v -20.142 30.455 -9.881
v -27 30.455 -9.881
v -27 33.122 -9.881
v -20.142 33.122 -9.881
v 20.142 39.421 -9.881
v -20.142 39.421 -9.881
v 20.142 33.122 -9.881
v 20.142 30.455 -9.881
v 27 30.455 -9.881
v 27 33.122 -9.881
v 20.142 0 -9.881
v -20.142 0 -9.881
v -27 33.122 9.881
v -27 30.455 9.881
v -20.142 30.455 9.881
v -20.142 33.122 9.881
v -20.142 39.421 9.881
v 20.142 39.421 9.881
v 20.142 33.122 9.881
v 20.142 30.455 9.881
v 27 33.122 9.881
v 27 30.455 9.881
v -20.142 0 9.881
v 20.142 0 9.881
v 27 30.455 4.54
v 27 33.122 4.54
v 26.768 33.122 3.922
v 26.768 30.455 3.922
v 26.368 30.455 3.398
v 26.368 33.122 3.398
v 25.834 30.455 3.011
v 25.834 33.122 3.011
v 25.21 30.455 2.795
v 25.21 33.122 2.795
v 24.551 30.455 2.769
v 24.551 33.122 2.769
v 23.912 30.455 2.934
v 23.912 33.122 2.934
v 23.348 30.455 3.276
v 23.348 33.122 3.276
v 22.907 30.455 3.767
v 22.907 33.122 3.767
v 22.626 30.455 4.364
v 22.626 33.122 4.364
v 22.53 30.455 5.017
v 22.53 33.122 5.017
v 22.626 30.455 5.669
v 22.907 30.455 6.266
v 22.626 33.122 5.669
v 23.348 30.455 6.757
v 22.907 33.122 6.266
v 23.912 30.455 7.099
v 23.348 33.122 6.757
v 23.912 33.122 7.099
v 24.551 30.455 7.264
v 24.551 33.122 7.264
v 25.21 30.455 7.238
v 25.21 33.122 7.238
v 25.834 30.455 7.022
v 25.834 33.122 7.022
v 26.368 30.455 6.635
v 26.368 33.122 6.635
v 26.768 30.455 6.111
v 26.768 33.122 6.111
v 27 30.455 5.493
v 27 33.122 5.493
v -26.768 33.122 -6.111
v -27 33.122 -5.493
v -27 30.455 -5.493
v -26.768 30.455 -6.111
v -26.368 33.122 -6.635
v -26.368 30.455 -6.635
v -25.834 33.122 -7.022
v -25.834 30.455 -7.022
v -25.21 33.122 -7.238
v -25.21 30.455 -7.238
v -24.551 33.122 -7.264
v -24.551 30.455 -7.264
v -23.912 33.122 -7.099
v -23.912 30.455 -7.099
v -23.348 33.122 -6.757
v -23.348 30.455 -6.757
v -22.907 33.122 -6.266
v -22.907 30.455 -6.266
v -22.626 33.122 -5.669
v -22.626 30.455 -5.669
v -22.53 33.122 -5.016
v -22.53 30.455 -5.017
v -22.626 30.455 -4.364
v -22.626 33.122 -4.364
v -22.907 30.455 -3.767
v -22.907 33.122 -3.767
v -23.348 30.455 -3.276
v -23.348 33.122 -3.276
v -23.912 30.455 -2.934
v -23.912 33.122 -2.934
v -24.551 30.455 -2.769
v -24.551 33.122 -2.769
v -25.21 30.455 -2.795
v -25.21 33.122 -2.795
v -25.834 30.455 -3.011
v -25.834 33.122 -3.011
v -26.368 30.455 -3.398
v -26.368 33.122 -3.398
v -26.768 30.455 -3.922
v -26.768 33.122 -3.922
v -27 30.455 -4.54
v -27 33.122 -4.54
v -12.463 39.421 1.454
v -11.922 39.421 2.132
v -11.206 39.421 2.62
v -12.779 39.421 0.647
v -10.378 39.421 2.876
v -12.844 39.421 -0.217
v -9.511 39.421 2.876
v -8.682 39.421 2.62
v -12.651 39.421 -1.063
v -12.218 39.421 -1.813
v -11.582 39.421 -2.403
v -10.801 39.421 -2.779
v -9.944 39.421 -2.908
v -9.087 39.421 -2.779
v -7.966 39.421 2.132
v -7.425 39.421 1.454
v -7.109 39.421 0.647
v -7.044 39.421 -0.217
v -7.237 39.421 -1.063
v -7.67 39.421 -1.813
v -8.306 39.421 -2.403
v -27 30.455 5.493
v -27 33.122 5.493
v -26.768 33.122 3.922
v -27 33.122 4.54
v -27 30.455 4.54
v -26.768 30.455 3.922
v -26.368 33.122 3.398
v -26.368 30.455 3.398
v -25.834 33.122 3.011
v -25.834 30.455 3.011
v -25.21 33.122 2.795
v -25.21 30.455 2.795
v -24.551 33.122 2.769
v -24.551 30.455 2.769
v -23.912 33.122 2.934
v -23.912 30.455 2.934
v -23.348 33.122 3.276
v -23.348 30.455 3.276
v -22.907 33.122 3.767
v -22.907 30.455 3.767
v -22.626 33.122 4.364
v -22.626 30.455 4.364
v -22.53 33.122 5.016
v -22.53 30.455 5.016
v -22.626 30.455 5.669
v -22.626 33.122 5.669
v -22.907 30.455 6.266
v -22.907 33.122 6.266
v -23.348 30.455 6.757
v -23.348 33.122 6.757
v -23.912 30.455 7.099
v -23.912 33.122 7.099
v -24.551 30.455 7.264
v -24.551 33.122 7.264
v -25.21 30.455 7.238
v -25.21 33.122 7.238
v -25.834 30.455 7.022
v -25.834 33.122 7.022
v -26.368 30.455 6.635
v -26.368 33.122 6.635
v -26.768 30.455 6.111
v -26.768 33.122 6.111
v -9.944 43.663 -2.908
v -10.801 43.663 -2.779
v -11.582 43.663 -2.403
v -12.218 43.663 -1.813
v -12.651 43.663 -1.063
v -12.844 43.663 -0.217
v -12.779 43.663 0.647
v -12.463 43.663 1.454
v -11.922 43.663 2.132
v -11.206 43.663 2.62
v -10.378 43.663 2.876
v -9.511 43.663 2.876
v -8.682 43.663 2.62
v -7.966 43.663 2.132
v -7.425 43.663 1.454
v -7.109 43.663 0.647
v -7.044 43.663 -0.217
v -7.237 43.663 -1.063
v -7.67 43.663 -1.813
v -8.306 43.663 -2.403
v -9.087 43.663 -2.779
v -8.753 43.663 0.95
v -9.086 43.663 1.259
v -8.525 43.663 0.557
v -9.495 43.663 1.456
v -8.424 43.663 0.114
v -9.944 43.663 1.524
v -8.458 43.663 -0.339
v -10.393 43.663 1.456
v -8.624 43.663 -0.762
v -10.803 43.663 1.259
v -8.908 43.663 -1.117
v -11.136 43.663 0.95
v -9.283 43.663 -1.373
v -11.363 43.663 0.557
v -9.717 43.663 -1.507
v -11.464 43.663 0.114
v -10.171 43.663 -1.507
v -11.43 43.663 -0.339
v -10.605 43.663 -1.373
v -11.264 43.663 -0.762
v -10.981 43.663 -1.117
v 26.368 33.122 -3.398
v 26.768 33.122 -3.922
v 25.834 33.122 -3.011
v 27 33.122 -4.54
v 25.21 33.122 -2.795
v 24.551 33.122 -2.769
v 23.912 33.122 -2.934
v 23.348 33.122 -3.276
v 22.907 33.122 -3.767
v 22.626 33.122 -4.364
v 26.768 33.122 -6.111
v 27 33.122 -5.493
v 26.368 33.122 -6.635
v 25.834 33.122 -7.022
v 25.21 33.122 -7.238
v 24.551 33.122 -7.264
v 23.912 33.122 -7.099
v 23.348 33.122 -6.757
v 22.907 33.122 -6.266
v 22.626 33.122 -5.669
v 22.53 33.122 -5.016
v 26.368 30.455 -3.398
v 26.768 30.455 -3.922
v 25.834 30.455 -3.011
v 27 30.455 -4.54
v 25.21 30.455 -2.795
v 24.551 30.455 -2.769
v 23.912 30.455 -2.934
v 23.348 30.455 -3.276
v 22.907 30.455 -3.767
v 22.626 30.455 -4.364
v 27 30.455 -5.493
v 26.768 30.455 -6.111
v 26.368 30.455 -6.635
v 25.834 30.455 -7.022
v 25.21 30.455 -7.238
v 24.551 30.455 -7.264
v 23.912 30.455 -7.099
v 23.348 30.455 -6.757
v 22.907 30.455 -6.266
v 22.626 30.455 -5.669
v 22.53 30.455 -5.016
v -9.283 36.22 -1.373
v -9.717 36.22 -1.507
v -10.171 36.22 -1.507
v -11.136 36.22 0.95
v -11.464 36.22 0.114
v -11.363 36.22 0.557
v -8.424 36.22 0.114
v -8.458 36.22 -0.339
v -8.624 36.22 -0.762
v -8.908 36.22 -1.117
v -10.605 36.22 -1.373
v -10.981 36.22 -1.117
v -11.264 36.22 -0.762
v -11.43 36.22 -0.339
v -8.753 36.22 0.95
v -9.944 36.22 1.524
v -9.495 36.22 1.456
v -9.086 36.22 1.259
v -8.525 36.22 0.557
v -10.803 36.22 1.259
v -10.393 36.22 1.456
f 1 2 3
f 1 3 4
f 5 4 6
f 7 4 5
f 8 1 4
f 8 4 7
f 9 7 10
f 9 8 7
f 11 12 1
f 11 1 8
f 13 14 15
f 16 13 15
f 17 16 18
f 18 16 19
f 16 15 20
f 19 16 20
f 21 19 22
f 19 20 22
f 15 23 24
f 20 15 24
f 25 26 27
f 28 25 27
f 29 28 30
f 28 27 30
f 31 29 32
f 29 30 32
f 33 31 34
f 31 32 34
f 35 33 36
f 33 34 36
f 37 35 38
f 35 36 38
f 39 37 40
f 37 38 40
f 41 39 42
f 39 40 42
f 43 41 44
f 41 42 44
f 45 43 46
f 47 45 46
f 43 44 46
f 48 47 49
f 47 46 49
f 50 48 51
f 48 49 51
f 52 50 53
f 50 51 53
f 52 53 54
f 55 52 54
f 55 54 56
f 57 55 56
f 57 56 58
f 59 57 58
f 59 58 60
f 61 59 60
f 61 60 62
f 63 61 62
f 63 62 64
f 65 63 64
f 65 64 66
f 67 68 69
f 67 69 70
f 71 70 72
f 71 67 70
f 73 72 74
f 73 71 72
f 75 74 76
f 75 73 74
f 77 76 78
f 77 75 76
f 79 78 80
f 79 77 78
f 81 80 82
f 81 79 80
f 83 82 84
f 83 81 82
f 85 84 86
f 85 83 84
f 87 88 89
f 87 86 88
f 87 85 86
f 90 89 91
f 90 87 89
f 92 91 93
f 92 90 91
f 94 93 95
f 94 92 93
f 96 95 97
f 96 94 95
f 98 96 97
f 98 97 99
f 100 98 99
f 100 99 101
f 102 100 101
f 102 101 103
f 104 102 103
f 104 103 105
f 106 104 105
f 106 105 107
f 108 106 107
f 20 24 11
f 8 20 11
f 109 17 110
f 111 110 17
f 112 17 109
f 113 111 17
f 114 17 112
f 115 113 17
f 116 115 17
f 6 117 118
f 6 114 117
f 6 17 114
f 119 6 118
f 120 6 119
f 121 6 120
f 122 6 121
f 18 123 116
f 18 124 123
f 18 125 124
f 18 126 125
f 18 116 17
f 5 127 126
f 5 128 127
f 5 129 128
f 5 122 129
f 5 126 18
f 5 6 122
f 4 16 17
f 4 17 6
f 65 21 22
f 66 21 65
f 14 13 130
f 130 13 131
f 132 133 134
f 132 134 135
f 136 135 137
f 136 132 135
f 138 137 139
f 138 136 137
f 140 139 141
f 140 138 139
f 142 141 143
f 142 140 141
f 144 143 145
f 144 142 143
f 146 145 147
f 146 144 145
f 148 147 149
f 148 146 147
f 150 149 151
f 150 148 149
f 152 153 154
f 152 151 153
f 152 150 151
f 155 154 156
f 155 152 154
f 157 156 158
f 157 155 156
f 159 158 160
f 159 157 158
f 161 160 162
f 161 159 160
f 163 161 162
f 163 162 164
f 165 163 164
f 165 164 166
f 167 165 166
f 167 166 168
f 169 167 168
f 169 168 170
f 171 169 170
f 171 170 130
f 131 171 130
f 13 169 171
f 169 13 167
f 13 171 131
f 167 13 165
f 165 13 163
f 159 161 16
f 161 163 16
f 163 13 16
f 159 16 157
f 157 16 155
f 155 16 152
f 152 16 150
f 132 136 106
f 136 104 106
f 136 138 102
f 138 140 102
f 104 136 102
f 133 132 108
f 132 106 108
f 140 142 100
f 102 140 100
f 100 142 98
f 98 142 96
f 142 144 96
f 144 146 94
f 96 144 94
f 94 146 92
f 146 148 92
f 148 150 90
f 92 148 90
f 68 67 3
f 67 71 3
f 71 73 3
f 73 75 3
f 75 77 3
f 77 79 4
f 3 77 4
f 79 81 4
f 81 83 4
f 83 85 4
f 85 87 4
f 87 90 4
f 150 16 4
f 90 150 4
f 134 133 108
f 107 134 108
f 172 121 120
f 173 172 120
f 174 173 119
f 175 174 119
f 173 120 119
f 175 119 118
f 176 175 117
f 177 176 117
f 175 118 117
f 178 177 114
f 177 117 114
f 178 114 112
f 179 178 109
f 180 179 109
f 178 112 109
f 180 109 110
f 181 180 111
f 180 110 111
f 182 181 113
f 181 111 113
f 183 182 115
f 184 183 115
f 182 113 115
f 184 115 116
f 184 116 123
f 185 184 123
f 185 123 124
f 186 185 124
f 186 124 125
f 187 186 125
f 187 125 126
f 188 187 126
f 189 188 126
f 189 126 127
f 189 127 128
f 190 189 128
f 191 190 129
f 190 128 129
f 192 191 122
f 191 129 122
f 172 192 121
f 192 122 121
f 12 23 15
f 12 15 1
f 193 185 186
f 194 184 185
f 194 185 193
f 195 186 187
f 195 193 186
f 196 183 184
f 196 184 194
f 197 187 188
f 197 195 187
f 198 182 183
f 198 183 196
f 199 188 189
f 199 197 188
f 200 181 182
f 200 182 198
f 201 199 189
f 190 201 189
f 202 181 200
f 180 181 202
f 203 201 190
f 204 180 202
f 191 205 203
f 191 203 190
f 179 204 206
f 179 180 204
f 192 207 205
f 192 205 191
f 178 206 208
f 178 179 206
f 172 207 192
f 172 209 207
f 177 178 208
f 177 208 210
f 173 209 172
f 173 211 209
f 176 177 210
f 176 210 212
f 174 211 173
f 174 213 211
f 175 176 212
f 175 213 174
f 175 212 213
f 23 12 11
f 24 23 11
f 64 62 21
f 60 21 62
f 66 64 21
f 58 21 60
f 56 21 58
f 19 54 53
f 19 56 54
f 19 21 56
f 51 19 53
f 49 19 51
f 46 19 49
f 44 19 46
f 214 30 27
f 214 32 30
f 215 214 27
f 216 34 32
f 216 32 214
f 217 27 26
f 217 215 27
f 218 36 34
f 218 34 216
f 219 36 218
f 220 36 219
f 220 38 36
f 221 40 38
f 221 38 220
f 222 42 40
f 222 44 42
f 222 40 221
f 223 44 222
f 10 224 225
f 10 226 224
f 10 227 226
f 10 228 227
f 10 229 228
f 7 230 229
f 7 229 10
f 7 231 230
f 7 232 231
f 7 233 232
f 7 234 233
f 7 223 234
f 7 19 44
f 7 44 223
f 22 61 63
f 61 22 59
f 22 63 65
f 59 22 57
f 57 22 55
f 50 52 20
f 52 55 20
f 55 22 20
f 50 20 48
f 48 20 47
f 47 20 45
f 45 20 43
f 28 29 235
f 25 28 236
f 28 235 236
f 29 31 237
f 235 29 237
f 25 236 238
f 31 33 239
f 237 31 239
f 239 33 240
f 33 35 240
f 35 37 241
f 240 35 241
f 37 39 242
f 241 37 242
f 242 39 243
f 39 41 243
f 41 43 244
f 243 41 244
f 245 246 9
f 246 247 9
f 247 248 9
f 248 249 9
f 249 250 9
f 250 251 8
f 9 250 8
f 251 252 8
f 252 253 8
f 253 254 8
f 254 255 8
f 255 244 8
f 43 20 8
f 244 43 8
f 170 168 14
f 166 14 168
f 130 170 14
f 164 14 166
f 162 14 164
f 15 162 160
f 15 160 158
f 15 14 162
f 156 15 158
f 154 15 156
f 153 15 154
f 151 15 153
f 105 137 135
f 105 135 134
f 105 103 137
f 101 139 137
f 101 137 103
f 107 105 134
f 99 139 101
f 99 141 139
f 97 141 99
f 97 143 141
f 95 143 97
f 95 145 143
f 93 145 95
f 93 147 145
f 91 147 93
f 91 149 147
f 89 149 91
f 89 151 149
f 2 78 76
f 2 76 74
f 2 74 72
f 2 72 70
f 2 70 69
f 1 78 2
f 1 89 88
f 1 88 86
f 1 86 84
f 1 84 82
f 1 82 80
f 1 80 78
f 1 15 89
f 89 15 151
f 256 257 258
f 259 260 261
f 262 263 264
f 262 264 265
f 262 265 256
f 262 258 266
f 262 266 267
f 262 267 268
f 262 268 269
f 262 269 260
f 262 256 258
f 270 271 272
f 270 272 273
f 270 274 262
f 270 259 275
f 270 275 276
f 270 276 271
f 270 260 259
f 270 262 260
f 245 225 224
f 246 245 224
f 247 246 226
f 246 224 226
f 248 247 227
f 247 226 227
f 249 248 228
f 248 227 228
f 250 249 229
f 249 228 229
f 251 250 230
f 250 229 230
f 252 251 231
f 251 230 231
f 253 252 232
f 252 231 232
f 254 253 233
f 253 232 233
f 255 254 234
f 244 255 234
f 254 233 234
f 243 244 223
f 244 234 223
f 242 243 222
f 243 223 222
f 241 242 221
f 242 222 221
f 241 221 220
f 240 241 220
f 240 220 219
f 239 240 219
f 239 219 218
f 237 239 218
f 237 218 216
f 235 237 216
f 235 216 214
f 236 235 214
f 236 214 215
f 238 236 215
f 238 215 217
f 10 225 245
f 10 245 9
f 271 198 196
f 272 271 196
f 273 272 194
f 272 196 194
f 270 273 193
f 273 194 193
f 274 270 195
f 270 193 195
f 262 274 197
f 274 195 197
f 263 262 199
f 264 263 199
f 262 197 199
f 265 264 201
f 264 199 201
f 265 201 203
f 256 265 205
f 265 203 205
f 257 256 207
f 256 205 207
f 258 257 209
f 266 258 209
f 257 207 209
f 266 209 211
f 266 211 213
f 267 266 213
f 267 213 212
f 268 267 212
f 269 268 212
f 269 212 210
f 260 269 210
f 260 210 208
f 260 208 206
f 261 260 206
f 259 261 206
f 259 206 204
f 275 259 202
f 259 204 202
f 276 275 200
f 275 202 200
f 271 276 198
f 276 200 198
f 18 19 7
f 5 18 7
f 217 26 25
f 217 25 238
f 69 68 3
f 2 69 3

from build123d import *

# Parameters (mm, degrees)
SKETCH1_W           = 40.2844
SKETCH1_H           = 19.7612
BOSS_EXTRUDE1_DEPTH = 39.4208
SKETCH2_W           = 19.7612
SKETCH2_H           = 2.667
BOSS_EXTRUDE2_DEPTH = 6.858
SKETCH3_R           = 2.2606
CUT_EXTRUDE2_DEPTH  = 44.859747411
SKETCH4_R           = 2.9083
BOSS_EXTRUDE3_DEPTH = 4.2418
SKETCH5_R           = 1.524
CUT_EXTRUDE3_DEPTH  = 7.4422


with BuildPart() as part:
    # Sketch1 → Boss-Extrude1 (new body)
    with BuildSketch(Plane(origin=(0, 0, 0), x_dir=(1, 0, 0), z_dir=(0, 1, 0))):
        Rectangle(SKETCH1_W, SKETCH1_H)
    extrude(amount=BOSS_EXTRUDE1_DEPTH)

    # Sketch2 → Boss-Extrude2 (add)
    with BuildSketch(Plane(origin=(20.1422, 0, 0), x_dir=(0, 0, -1), z_dir=(1, 0, 0))):
        with Locations((0, 31.7881)):
            Rectangle(SKETCH2_W, SKETCH2_H)
    boss_extrude2 = extrude(amount=BOSS_EXTRUDE2_DEPTH)

    # Sketch3 → Cut-Extrude2 (cut, through all)
    with BuildSketch(Plane(origin=(0, 33.1216, 0), x_dir=(1, 0, 0), z_dir=(0, 1, 0))):
        with Locations((24.7904, 5.0165)):
            Circle(SKETCH3_R)
        with Locations((24.7904, -5.0165)):
            Circle(SKETCH3_R)
    cut_extrude2 = extrude(amount=-CUT_EXTRUDE2_DEPTH, mode=Mode.SUBTRACT)

    # Mirror1: Boss-Extrude2, Cut-Extrude2 across plane
    add(boss_extrude2.mirror(Plane(origin=(0, 0, 0), x_dir=(0, 0, 1), z_dir=(1, 0, 0))))
    add(cut_extrude2.mirror(Plane(origin=(0, 0, 0), x_dir=(0, 0, 1), z_dir=(1, 0, 0))), mode=Mode.SUBTRACT)

    # Sketch4 → Boss-Extrude3 (add)
    with BuildSketch(Plane(origin=(0, 39.4208, 0), x_dir=(1, 0, 0), z_dir=(0, 1, 0))):
        with Locations(Location((-9.9441, 0, 0), (0, 0, 90))):
            Circle(SKETCH4_R)
    extrude(amount=BOSS_EXTRUDE3_DEPTH)

    # Sketch5 → Cut-Extrude3 (cut)
    with BuildSketch(Plane(origin=(0, 43.6626, 0), x_dir=(1, 0, 0), z_dir=(0, 1, 0))):
        with Locations(Location((-9.9441, 0, 0), (0, 0, 270))):
            Circle(SKETCH5_R)
    extrude(amount=-CUT_EXTRUDE3_DEPTH, mode=Mode.SUBTRACT)


solid = part.part
